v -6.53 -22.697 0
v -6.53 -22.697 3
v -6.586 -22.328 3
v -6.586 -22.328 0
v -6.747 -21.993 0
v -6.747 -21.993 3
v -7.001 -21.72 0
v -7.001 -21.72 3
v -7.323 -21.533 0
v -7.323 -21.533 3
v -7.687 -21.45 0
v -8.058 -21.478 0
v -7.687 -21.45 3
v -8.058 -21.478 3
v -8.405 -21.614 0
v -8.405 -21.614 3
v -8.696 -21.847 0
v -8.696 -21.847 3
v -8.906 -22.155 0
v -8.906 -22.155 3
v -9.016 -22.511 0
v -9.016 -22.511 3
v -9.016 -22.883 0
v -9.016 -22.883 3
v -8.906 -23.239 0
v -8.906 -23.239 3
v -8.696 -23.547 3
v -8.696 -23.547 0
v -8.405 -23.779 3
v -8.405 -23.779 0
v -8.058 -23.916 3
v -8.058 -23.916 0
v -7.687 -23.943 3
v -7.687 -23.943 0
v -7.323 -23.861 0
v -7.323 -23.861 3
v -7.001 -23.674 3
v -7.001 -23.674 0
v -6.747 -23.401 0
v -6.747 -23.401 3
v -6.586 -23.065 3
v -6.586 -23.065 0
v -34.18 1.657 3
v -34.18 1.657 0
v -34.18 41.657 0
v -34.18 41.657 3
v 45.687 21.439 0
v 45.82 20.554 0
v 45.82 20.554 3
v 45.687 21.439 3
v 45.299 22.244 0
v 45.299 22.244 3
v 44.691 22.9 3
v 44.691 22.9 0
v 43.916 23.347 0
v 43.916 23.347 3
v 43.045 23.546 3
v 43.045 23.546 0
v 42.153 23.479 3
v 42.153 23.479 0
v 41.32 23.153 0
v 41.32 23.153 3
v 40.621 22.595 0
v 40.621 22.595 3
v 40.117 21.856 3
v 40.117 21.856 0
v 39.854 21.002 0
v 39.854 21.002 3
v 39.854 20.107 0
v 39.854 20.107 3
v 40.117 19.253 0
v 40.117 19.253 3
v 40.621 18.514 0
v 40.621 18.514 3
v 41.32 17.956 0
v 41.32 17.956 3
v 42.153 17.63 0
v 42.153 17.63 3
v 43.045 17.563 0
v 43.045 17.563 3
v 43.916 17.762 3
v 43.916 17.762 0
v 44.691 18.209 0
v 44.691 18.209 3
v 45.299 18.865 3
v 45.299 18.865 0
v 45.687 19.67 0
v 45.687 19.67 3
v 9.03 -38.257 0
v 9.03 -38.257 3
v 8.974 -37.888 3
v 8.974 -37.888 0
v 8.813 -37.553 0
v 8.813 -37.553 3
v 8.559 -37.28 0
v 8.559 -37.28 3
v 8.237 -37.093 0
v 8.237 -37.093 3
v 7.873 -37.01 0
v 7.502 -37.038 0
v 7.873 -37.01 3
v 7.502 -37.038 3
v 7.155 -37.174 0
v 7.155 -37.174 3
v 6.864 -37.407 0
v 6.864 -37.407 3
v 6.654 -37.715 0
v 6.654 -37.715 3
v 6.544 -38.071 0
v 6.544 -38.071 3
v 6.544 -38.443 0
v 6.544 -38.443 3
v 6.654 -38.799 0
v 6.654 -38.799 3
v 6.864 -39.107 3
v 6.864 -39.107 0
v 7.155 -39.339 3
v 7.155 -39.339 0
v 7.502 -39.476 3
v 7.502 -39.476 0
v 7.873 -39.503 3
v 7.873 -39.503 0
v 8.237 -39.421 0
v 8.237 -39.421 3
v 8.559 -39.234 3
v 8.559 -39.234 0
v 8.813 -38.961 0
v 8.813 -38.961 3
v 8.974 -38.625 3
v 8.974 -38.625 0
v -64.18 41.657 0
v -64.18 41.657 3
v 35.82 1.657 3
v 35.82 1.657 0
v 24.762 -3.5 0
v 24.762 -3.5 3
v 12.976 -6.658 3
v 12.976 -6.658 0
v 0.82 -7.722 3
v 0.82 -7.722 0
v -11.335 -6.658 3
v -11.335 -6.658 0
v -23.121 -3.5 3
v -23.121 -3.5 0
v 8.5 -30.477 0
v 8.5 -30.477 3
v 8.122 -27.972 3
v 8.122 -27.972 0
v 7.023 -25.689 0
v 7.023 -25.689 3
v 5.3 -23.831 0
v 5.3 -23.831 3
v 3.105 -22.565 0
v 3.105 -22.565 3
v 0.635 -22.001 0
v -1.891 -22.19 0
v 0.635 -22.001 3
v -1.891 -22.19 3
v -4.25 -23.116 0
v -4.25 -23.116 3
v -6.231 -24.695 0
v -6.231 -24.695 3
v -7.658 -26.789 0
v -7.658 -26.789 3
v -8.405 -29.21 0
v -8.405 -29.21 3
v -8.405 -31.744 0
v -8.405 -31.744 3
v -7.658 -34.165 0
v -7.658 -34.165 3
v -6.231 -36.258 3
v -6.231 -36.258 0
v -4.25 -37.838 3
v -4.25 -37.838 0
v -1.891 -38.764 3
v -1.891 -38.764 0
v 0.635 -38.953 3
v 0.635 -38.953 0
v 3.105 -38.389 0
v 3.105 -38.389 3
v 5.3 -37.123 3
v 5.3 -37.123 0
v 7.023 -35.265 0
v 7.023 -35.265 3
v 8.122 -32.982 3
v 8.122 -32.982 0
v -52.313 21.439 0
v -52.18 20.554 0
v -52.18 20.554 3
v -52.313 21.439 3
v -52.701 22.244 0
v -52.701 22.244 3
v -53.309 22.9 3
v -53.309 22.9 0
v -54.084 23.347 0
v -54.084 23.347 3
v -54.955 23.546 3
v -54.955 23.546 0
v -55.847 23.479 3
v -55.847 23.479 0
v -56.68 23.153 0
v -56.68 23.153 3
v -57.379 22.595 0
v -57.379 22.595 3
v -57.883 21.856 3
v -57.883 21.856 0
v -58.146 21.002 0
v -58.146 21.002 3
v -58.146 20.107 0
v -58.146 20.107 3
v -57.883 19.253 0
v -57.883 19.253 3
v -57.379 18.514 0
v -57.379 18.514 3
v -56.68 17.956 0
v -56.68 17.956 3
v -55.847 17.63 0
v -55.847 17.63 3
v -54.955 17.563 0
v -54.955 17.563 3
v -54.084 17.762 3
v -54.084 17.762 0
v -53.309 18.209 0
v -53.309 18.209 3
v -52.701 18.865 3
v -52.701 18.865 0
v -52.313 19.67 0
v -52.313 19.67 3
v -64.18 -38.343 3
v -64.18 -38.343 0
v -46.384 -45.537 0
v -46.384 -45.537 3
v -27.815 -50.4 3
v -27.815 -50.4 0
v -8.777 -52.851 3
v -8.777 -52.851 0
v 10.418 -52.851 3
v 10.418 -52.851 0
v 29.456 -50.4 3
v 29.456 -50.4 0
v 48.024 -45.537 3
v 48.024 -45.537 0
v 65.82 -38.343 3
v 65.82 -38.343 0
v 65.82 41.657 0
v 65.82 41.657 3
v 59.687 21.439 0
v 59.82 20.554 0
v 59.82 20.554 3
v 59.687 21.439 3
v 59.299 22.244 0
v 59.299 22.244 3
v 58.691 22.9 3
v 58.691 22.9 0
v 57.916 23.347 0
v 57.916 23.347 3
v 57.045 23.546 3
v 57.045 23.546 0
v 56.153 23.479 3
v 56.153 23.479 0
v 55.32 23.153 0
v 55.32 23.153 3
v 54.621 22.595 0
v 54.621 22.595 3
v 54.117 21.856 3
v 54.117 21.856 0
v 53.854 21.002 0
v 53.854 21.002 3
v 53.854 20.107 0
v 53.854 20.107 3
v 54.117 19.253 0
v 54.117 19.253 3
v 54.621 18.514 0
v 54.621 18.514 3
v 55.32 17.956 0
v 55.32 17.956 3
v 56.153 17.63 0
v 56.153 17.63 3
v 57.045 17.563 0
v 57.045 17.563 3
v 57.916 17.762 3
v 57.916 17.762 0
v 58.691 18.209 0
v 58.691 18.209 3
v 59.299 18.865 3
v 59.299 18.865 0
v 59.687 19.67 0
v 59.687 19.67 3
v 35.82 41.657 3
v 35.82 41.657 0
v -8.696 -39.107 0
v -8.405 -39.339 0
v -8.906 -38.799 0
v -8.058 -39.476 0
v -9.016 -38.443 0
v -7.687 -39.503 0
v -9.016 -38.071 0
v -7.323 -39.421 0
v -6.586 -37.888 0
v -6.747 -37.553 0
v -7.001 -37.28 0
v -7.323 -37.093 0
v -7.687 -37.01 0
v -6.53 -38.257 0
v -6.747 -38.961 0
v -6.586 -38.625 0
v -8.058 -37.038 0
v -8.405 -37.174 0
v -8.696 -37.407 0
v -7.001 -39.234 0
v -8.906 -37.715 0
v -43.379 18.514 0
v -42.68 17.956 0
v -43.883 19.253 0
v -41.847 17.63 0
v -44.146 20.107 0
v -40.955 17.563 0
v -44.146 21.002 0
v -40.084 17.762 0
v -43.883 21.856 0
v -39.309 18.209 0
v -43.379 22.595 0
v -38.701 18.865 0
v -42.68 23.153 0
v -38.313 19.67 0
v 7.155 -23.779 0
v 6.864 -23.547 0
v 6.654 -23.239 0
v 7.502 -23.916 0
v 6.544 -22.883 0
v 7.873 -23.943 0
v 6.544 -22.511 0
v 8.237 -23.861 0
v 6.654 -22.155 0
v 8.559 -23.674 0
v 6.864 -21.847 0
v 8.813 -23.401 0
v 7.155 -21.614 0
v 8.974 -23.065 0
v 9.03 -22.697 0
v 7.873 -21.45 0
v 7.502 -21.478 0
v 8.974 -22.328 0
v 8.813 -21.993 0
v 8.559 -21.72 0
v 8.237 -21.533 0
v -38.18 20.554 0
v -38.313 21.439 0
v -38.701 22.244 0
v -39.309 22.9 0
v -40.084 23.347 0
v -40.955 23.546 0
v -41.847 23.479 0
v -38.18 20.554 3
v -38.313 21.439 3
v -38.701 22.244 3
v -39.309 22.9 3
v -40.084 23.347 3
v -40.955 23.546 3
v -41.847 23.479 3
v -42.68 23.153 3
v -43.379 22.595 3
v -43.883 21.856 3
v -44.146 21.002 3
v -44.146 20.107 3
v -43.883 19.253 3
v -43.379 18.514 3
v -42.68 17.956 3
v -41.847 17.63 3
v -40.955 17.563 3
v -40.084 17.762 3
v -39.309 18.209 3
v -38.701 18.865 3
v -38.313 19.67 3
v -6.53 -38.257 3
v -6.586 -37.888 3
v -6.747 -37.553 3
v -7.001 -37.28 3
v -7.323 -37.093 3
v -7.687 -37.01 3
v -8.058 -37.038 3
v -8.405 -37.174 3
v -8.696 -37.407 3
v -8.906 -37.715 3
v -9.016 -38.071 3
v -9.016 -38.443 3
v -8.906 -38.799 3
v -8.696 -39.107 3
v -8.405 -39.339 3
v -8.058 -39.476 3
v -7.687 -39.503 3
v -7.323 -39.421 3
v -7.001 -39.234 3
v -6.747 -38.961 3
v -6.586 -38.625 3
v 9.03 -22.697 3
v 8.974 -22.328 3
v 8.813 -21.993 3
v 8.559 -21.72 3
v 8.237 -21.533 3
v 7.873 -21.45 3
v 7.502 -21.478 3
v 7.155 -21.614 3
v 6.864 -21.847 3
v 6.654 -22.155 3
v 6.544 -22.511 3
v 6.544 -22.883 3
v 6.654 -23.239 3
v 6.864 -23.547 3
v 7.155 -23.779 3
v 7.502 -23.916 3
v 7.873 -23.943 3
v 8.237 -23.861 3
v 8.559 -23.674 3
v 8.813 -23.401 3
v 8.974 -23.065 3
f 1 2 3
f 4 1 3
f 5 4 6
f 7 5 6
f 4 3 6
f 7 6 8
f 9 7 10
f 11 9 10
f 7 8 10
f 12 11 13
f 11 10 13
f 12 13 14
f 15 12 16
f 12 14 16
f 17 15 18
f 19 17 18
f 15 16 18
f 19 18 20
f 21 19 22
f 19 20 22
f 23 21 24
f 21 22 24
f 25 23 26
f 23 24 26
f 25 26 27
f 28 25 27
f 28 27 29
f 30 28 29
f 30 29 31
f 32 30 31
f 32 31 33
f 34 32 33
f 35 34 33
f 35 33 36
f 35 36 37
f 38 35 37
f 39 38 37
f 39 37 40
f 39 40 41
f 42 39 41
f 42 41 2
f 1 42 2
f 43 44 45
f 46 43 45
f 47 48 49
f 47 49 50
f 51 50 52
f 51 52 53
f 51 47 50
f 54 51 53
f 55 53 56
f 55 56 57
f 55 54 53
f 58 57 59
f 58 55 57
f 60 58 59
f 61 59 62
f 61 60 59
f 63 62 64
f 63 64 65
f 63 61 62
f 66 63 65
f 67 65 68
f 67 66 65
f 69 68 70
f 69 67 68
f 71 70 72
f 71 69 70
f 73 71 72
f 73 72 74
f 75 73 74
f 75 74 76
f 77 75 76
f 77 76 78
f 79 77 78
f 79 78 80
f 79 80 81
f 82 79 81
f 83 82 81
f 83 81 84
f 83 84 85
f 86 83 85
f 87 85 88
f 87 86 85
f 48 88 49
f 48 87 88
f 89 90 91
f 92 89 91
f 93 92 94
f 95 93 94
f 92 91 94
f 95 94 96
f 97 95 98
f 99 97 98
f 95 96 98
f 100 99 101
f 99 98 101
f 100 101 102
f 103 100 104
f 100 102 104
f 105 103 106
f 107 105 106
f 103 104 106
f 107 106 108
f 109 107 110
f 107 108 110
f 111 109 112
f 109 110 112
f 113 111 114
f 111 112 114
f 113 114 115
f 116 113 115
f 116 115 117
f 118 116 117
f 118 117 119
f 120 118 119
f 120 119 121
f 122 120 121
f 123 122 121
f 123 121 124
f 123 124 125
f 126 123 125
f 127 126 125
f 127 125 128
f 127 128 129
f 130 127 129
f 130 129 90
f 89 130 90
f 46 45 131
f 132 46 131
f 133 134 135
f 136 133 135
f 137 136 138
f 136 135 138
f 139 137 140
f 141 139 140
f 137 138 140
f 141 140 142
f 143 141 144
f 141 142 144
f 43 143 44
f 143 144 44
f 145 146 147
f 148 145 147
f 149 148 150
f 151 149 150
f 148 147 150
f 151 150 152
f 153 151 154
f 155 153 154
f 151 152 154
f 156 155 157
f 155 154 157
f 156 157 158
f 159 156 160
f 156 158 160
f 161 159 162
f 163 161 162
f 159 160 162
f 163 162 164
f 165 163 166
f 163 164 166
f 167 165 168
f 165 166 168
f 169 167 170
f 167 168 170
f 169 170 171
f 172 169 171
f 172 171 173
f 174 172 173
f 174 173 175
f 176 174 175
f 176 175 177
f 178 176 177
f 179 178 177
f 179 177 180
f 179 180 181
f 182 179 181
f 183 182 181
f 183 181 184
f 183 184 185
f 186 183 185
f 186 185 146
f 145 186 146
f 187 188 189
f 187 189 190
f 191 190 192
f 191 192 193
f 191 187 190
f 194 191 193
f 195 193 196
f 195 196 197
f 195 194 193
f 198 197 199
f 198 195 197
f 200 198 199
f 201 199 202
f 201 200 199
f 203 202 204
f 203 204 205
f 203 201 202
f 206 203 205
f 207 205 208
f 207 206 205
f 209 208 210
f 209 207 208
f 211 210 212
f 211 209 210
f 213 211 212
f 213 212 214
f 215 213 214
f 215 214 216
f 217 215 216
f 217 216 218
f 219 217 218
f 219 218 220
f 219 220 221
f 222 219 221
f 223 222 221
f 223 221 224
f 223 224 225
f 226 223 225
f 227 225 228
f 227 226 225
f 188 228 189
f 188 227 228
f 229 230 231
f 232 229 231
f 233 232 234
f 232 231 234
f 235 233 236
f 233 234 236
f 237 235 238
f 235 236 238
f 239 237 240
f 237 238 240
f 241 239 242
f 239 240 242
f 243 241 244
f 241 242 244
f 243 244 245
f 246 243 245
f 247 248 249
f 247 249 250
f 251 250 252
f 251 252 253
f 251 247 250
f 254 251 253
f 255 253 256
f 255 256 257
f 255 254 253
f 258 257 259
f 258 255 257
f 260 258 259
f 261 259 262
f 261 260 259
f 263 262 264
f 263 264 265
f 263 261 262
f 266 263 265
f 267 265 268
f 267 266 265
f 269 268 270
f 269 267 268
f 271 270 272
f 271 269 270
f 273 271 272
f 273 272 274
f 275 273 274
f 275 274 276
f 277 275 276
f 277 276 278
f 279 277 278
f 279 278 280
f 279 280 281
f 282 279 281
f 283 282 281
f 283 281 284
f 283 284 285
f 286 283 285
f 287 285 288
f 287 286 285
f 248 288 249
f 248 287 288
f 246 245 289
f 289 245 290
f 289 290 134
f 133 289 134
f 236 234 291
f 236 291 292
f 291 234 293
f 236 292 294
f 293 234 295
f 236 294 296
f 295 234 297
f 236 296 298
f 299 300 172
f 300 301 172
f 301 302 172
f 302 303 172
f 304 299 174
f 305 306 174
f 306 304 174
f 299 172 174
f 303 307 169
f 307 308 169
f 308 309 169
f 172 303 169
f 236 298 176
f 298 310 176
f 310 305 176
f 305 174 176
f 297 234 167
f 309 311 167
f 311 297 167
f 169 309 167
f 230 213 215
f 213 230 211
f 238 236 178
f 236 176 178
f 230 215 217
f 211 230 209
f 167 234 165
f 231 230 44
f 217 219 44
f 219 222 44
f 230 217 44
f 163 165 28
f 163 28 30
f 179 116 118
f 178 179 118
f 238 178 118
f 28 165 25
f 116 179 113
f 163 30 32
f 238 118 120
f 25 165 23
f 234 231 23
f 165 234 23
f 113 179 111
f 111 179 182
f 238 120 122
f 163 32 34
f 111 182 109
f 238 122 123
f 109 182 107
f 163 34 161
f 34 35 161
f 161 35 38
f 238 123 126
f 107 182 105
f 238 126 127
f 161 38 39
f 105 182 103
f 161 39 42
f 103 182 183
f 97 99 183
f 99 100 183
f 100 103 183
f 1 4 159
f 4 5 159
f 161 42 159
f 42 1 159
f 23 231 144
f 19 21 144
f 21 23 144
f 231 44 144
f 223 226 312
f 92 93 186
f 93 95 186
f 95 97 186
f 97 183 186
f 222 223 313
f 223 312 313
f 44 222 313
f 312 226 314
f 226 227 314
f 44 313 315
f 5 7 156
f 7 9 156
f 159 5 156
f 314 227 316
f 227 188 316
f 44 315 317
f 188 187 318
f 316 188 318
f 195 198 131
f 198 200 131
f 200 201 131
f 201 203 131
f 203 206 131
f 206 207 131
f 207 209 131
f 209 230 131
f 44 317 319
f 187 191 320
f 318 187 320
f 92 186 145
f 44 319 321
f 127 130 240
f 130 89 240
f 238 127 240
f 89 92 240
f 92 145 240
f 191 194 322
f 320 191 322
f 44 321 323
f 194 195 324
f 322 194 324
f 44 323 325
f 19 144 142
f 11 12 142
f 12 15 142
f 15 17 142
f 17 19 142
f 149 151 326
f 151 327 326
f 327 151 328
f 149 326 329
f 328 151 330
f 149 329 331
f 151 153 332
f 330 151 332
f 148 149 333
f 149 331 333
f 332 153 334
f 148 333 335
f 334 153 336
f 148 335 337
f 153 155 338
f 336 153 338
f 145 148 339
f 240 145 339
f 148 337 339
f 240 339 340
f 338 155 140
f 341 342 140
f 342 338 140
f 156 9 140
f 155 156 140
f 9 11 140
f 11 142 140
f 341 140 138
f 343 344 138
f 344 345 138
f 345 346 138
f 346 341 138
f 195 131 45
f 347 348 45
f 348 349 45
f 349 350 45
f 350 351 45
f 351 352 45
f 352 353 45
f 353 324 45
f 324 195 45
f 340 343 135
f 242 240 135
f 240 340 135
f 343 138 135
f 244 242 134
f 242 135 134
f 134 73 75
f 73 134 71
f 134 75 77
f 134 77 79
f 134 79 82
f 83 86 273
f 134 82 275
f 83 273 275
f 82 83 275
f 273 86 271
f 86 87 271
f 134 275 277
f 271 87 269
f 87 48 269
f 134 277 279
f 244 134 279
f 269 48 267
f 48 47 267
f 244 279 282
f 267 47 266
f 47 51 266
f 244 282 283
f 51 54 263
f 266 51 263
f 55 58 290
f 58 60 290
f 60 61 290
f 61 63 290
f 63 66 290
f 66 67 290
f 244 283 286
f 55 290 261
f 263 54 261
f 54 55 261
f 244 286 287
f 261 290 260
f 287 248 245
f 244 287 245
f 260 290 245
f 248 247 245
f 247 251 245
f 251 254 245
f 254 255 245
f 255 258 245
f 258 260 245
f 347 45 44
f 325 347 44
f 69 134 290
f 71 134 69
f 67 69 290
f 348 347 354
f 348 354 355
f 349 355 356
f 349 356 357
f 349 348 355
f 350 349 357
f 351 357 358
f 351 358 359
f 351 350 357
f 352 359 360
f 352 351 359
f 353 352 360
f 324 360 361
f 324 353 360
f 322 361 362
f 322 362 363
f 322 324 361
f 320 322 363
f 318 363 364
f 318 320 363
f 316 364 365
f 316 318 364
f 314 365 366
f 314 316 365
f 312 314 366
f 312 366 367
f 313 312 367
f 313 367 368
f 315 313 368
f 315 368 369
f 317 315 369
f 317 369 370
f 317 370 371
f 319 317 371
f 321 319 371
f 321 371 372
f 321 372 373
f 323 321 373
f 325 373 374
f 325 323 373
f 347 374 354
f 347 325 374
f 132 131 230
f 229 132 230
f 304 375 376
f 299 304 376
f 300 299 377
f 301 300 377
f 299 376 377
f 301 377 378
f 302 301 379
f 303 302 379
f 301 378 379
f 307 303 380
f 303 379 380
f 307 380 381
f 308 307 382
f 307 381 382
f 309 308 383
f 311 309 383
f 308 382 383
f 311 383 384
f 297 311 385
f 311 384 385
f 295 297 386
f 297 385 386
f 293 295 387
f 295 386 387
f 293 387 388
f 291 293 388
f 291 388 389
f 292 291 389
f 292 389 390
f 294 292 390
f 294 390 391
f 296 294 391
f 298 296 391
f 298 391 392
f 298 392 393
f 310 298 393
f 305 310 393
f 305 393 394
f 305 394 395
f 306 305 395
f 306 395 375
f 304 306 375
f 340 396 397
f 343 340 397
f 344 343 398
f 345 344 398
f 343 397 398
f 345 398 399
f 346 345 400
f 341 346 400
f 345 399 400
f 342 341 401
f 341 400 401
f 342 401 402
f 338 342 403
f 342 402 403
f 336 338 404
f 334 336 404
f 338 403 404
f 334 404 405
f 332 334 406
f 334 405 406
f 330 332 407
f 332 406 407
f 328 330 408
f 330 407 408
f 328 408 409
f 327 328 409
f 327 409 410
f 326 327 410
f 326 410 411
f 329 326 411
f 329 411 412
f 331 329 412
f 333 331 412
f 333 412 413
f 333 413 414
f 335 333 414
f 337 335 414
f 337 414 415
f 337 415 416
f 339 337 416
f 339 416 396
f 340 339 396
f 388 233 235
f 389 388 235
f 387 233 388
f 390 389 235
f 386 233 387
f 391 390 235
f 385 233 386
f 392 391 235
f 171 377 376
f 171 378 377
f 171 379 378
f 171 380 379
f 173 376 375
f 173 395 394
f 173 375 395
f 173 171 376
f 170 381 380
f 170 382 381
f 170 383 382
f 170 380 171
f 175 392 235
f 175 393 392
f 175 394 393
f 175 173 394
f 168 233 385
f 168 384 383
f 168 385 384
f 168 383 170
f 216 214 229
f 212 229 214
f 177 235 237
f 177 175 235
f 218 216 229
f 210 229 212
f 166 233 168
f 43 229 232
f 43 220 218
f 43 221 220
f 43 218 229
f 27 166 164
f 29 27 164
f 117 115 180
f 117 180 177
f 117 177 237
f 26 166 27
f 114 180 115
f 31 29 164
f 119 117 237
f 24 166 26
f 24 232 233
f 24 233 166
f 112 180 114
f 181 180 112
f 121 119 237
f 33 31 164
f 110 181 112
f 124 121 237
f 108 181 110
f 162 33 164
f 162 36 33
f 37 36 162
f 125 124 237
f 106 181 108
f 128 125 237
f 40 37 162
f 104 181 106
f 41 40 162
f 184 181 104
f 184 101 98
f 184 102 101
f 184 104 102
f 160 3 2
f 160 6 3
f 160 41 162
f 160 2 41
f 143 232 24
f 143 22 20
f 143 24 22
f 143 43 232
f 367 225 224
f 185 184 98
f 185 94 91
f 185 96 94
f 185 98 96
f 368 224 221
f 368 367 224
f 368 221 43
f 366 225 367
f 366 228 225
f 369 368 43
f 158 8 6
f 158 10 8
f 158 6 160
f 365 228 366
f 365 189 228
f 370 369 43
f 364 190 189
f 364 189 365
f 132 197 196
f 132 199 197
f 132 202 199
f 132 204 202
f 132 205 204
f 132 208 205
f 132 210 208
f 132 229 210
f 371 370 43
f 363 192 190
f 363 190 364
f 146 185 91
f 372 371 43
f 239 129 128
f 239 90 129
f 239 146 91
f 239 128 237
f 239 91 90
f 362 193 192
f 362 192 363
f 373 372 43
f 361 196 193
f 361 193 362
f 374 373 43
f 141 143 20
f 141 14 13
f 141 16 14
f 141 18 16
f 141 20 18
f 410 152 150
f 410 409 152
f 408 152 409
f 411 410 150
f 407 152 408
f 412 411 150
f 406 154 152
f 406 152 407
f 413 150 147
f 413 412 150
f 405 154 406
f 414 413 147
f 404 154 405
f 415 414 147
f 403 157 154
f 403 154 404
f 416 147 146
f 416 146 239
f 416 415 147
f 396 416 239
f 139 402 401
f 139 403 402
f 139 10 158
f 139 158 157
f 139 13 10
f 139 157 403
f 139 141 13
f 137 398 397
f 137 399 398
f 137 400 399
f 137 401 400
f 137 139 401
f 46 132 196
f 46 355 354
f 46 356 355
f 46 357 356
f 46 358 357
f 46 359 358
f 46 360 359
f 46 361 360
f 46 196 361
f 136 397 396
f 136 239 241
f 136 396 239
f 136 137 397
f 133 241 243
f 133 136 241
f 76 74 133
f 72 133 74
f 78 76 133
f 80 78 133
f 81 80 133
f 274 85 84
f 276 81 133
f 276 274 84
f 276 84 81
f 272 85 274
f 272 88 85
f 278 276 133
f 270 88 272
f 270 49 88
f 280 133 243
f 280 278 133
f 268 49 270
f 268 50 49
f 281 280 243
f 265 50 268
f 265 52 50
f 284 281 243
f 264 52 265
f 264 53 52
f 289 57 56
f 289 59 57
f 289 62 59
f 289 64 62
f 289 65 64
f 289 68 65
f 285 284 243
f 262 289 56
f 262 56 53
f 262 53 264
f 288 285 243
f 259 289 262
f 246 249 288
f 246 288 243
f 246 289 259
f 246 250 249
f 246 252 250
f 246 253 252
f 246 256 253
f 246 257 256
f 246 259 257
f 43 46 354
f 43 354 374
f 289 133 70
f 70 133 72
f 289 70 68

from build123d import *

# Parameters (mm, degrees)
SKETCH1_R           = 3
BOSS_EXTRUDE2_DEPTH = 3
SKETCH4_R           = 1.25
SKETCH4_R_2         = 8.5
CUT_EXTRUDE2_DEPTH  = 10


with BuildPart() as part:
    # Sketch1 → Boss-Extrude2 (new body)
    with BuildSketch(Plane.XY):
        with BuildLine():
            Line((-34.17966517, 1.656542757), (-34.17966517, 41.656542757))
            Line((-34.17966517, 41.656542757), (-64.17966517, 41.656542757))
            Line((-64.17966517, 41.656542757), (-64.17966517, -38.343457243))
            ThreePointArc((-64.17966517, -38.343457243), (0.82033483, -53.158398897), (65.82033483, -38.343457243))
            Line((65.82033483, -38.343457243), (65.82033483, 41.656542757))
            Line((65.82033483, 41.656542757), (35.82033483, 41.656542757))
            Line((35.82033483, 41.656542757), (35.82033483, 1.656542757))
            ThreePointArc((35.82033483, 1.656542757), (0.82033483, -7.721678978), (-34.17966517, 1.656542757))
        make_face()
        with Locations((56.82033483, 20.554474708)):
            Circle(SKETCH1_R, mode=Mode.SUBTRACT)
        with Locations((42.82033483, 20.554474708)):
            Circle(SKETCH1_R, mode=Mode.SUBTRACT)
        with Locations((-55.17966517, 20.554474708)):
            Circle(SKETCH1_R, mode=Mode.SUBTRACT)
        with Locations((-41.17966517, 20.554474708)):
            Circle(SKETCH1_R, mode=Mode.SUBTRACT)
    extrude(amount=BOSS_EXTRUDE2_DEPTH)

    # Sketch4 → Cut-Extrude2 (cut)
    with BuildSketch(Plane.XY.offset(3)):
        with Locations((7.78, -22.696934593)):
            Circle(SKETCH4_R)
        with Locations((7.78, -38.256934593)):
            Circle(SKETCH4_R)
        with Locations((-7.78, -38.256934593)):
            Circle(SKETCH4_R)
        with Locations((-7.78, -22.696934593)):
            Circle(SKETCH4_R)
        with Locations((0, -30.476934593)):
            Circle(SKETCH4_R_2)
    extrude(amount=-CUT_EXTRUDE2_DEPTH, mode=Mode.SUBTRACT)


solid = part.part
